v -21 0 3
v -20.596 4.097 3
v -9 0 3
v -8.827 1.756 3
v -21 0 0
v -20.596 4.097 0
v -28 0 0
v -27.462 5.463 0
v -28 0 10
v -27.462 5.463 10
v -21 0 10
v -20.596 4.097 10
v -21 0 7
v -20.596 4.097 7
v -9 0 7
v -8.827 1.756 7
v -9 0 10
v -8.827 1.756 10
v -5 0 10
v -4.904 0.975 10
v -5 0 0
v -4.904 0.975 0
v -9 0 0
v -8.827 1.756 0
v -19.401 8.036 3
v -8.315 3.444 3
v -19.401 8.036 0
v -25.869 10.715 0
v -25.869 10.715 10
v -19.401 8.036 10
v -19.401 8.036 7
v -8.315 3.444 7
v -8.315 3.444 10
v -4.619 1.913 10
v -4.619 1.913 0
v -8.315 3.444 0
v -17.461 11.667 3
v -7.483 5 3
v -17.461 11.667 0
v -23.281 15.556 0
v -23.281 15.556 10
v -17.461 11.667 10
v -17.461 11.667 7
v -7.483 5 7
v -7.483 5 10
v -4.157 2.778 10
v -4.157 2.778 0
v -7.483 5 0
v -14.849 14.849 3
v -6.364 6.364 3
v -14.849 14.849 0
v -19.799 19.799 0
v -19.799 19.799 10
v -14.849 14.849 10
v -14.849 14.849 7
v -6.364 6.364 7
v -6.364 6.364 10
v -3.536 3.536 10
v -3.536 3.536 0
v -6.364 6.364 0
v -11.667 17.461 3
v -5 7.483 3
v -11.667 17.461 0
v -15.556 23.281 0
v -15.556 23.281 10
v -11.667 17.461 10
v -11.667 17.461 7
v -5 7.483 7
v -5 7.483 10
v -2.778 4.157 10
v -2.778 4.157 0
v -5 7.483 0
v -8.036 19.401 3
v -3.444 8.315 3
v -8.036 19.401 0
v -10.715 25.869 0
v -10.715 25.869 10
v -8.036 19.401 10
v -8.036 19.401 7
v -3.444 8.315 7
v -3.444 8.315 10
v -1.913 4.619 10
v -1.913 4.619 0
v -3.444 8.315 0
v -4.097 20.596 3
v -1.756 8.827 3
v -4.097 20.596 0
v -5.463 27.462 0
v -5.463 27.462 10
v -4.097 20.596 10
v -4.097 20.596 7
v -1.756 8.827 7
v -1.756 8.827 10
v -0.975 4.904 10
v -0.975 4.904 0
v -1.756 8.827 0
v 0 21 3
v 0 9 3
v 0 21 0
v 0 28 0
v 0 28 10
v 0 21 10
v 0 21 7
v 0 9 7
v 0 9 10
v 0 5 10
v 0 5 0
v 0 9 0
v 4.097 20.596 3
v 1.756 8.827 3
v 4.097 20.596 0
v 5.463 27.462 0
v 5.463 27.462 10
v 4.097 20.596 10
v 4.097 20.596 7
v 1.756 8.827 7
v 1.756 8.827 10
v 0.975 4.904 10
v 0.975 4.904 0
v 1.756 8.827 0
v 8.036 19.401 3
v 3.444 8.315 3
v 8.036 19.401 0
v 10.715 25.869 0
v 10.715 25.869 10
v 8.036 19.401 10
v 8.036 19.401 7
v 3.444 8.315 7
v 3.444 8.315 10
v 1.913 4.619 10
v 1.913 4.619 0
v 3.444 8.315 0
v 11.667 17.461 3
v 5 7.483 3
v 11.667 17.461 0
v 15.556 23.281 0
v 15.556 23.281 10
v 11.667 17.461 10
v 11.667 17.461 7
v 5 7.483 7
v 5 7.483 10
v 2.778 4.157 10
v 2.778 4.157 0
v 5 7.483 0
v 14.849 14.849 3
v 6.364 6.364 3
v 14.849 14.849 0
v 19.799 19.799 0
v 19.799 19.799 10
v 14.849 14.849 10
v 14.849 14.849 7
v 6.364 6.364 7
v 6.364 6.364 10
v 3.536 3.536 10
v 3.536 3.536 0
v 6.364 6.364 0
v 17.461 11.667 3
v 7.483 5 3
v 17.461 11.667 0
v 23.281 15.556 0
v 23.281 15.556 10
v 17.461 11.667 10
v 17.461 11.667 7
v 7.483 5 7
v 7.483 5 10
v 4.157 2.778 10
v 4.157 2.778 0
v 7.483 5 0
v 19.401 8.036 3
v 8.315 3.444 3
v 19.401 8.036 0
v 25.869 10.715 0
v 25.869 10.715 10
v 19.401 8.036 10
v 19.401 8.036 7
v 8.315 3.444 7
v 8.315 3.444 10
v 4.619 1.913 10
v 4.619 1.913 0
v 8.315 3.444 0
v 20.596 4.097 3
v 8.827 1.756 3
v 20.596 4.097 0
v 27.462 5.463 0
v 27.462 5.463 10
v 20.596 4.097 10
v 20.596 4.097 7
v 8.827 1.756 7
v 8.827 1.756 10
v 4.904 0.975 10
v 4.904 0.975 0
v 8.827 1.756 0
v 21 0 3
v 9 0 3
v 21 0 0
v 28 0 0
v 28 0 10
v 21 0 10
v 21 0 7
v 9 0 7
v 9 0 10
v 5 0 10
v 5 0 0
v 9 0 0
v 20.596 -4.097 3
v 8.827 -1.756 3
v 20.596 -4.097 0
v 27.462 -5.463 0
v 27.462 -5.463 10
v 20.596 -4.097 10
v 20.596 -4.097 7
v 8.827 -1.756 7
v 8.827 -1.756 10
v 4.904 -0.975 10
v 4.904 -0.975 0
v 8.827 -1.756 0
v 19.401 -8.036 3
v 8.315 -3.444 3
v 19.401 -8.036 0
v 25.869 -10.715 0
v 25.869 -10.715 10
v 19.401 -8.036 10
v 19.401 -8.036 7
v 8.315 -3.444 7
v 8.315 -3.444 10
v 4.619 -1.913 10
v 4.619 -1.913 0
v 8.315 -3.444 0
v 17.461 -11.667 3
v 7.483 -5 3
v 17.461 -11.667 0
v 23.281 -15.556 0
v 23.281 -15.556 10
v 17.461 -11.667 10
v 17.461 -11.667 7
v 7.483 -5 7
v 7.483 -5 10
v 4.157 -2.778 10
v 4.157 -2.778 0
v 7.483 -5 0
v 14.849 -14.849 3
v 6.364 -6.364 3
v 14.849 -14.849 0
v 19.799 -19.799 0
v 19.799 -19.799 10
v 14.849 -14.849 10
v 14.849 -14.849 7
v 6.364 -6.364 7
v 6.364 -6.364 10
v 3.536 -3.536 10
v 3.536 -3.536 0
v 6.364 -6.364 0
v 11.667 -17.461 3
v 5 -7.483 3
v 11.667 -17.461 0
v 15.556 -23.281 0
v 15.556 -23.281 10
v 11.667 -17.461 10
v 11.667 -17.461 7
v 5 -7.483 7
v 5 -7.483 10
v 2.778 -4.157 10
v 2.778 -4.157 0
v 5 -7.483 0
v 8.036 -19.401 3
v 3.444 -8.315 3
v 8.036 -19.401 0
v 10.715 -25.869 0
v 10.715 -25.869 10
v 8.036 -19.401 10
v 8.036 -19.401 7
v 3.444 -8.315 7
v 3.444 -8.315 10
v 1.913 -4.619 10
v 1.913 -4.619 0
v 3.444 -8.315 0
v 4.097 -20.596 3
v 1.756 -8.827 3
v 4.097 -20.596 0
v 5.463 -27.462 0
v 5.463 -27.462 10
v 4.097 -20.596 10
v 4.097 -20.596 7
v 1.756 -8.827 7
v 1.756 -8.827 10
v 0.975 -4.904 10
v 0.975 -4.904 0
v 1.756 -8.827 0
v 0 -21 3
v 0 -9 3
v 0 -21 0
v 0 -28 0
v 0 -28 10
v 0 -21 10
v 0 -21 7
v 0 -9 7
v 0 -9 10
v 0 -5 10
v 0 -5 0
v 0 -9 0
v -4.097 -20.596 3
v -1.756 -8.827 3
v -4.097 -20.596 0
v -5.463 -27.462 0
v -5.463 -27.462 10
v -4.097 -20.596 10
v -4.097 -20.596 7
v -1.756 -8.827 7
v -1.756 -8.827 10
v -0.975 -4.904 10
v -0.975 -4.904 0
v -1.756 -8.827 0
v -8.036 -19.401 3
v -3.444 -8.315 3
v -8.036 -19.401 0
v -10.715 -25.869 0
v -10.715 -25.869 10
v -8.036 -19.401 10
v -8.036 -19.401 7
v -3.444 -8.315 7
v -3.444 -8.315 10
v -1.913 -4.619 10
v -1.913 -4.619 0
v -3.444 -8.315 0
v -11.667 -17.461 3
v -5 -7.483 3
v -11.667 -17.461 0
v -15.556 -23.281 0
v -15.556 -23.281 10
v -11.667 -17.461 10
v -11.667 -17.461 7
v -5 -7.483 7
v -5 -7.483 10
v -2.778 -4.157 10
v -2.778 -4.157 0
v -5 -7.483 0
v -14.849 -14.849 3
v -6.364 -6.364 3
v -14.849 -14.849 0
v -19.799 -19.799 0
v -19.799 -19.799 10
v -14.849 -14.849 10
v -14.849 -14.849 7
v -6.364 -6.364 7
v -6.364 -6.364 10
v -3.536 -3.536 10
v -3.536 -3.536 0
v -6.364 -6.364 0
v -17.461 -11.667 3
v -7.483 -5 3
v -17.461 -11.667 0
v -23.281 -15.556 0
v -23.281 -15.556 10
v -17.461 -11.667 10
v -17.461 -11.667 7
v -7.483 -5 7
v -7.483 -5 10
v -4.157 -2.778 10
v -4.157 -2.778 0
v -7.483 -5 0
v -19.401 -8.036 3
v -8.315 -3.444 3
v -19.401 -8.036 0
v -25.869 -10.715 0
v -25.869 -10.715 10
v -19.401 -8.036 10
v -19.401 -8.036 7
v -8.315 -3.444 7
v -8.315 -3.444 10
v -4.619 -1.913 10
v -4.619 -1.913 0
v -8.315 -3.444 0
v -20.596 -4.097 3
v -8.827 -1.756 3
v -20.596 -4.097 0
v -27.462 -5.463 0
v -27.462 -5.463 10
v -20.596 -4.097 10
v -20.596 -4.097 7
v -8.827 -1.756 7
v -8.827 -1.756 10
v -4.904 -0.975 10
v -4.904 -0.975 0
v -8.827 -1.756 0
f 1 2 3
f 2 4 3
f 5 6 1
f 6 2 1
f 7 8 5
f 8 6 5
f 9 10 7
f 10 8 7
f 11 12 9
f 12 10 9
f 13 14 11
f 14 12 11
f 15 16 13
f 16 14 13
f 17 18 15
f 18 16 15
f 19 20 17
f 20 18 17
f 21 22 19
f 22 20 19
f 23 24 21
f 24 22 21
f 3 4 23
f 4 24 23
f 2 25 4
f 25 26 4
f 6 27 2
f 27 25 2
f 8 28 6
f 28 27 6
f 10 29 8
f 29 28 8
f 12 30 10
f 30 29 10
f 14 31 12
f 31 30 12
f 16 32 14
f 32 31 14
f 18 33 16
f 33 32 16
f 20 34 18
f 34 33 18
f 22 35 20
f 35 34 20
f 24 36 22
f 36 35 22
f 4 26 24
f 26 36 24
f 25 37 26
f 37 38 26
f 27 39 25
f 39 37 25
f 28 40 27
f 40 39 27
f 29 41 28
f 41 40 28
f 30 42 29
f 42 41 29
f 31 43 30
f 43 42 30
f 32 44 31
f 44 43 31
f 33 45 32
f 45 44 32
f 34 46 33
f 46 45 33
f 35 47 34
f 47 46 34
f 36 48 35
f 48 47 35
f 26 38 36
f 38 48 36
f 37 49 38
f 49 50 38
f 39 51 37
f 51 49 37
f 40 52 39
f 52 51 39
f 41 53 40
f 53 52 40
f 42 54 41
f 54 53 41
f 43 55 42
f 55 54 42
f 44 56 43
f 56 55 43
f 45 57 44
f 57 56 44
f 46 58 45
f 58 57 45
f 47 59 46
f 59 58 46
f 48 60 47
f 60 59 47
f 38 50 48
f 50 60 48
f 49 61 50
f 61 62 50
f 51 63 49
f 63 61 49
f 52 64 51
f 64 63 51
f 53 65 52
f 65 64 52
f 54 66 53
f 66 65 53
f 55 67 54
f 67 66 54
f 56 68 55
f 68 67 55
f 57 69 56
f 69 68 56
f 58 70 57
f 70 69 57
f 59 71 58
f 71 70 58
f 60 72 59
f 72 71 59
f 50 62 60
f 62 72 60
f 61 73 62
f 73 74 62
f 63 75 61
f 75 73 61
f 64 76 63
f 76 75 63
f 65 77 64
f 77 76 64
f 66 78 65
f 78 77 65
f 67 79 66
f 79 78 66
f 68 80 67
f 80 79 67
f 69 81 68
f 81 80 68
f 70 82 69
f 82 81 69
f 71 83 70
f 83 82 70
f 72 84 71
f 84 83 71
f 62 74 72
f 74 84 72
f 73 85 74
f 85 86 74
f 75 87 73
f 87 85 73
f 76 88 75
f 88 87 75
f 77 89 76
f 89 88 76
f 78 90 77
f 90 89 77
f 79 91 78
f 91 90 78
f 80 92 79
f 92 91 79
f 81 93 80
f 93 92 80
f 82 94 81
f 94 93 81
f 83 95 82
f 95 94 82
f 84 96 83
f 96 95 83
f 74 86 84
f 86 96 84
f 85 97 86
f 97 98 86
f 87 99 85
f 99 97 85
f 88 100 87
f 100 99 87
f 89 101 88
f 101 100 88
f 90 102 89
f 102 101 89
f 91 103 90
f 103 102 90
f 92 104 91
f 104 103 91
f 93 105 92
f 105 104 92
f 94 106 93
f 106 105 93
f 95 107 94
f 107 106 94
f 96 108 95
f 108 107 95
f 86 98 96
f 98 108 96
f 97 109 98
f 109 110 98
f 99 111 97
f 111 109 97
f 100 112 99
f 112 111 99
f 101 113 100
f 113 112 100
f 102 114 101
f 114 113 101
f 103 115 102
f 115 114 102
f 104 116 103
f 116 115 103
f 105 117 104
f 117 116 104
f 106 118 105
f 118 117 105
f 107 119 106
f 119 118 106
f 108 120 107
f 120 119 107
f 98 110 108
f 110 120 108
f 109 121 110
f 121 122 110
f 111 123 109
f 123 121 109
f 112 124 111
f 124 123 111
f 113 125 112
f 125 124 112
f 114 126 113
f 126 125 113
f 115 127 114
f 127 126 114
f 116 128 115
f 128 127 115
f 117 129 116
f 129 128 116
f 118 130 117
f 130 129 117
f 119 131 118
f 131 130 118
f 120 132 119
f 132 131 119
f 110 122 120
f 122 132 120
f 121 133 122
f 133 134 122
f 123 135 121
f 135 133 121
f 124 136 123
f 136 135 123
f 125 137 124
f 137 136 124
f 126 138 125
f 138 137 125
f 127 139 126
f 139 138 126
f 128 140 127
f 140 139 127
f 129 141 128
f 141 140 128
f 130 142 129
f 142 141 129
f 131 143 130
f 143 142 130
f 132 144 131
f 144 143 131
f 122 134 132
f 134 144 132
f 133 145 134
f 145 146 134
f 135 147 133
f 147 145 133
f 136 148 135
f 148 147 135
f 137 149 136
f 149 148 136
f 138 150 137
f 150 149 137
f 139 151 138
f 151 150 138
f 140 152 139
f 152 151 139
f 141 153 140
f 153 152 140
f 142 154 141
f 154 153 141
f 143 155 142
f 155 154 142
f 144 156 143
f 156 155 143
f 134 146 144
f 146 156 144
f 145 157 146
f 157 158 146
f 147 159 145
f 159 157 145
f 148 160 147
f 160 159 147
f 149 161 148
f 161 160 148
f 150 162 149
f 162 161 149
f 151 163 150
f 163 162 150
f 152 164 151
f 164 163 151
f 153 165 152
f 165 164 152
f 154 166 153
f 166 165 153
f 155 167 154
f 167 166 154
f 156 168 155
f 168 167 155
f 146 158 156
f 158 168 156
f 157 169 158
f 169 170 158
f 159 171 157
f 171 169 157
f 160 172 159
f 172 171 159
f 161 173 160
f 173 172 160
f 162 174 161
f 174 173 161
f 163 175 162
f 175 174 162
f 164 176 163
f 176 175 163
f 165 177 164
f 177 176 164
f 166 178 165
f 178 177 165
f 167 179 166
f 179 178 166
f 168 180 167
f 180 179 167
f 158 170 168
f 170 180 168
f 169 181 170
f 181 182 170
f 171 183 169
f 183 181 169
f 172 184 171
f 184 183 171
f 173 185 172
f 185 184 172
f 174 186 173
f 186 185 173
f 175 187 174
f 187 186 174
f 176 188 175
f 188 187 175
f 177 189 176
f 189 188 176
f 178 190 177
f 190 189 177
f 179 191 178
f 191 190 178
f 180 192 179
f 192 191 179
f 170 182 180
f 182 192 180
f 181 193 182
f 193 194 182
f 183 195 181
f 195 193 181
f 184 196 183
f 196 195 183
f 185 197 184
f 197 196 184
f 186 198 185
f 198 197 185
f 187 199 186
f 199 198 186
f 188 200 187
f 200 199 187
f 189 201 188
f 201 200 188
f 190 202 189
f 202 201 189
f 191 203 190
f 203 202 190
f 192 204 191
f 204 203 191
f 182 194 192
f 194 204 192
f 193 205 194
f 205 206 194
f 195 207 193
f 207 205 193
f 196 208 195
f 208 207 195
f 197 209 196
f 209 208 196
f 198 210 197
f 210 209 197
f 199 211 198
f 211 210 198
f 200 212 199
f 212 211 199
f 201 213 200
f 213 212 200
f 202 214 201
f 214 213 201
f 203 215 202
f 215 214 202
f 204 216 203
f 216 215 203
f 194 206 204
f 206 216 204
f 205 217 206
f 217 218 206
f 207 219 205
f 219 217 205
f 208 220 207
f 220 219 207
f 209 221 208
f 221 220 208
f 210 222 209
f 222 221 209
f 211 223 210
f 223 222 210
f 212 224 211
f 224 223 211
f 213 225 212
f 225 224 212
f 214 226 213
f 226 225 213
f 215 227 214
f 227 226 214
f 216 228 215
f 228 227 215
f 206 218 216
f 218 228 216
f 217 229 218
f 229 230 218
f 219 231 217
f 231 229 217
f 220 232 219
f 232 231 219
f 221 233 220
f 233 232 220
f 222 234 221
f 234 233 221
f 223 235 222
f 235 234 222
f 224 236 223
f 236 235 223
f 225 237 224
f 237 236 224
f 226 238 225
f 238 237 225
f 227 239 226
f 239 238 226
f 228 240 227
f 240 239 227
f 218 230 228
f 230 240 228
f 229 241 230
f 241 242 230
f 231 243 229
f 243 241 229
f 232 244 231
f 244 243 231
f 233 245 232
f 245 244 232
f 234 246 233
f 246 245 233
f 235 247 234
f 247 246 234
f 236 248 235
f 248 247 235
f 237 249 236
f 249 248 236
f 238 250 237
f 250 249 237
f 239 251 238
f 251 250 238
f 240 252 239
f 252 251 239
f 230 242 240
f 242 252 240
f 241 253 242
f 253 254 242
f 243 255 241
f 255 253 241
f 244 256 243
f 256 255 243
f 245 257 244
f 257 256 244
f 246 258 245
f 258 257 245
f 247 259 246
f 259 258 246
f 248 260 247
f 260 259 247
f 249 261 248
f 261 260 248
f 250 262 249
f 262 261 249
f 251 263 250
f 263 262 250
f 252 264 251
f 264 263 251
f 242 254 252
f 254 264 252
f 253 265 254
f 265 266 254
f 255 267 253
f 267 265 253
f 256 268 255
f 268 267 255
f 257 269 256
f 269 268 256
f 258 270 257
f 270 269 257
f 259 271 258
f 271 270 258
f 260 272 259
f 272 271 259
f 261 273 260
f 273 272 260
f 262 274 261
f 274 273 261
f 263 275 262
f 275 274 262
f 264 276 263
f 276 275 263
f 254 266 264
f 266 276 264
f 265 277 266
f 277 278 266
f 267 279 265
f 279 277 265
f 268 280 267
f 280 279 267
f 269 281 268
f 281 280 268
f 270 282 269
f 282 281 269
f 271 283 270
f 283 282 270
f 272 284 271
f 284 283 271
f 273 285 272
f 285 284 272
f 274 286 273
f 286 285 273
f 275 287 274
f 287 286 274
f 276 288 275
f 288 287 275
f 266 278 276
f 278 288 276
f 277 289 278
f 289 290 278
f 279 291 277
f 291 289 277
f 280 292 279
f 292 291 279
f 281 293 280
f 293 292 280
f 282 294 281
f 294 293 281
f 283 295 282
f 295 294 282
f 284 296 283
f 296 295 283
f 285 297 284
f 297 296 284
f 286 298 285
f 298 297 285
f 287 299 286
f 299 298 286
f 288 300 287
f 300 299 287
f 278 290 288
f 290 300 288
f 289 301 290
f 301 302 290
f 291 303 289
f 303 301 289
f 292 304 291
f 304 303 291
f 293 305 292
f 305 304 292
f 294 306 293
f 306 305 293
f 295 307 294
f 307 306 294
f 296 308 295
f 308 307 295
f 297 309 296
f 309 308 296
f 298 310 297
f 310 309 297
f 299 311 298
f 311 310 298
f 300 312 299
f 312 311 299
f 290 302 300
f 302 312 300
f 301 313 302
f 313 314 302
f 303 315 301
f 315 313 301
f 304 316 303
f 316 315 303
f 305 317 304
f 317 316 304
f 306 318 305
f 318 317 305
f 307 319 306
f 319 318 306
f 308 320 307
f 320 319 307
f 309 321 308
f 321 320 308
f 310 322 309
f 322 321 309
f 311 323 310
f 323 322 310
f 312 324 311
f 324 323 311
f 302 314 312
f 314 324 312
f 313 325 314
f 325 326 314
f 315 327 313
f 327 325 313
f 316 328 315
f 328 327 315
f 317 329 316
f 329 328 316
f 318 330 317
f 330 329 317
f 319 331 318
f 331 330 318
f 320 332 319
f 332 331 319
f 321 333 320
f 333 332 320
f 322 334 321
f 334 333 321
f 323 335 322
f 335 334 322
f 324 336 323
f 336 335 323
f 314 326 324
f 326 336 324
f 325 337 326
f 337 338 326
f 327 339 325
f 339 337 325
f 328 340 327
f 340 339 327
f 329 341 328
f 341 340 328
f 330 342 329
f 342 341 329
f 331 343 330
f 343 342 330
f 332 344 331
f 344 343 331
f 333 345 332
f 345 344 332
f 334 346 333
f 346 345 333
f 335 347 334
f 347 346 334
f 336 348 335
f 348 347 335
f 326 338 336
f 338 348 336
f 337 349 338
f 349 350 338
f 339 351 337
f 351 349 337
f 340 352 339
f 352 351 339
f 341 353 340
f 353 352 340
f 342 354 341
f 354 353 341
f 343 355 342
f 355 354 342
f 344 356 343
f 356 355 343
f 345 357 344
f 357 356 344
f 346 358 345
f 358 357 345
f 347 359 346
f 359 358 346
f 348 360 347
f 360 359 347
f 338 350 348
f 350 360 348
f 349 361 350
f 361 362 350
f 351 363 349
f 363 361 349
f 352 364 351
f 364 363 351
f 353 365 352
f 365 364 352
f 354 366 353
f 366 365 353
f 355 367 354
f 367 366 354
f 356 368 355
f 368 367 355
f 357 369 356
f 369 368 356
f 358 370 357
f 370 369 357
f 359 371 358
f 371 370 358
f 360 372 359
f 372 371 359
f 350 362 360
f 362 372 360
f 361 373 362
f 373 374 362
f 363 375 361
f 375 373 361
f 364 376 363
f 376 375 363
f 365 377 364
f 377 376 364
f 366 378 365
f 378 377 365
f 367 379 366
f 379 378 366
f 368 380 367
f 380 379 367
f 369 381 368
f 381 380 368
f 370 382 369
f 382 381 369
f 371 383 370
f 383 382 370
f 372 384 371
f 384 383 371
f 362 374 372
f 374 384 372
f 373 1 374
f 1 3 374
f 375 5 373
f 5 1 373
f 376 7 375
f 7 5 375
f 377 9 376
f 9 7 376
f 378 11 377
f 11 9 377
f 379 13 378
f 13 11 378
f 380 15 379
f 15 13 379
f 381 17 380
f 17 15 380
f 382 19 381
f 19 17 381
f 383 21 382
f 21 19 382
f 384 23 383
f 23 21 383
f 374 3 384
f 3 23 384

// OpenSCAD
$fn = 32;

// ----------------------------------------------------------------------
// Revolved part: handwheel R28
// ----------------------------------------------------------------------

// --- parameters (mm) ---
bore_r = 5;               // bore radius
rim_r = 28;               // rim radius
rim_w = 7;                // rim axial width
rim_t = 10;               // rim diameter height
hub_r = 9;                // hub radius
web_t = 4;                // web thickness
revolve_angle = 360;      // revolve sweep, degrees

bore_d = 2 * bore_r;
rim_d = 2 * rim_r;
hub_d = 2 * hub_r;

profile = [[5, 0], [9, 0], [9, 3], [21, 3], [21, 0], [28, 0], [28, 10], [21, 10], [21, 7], [9, 7], [9, 10], [5, 10]];  // primary outline, 12 points, counter clockwise

// --- the one profile operation ---
rotate_extrude(angle = revolve_angle) polygon(points = profile);
